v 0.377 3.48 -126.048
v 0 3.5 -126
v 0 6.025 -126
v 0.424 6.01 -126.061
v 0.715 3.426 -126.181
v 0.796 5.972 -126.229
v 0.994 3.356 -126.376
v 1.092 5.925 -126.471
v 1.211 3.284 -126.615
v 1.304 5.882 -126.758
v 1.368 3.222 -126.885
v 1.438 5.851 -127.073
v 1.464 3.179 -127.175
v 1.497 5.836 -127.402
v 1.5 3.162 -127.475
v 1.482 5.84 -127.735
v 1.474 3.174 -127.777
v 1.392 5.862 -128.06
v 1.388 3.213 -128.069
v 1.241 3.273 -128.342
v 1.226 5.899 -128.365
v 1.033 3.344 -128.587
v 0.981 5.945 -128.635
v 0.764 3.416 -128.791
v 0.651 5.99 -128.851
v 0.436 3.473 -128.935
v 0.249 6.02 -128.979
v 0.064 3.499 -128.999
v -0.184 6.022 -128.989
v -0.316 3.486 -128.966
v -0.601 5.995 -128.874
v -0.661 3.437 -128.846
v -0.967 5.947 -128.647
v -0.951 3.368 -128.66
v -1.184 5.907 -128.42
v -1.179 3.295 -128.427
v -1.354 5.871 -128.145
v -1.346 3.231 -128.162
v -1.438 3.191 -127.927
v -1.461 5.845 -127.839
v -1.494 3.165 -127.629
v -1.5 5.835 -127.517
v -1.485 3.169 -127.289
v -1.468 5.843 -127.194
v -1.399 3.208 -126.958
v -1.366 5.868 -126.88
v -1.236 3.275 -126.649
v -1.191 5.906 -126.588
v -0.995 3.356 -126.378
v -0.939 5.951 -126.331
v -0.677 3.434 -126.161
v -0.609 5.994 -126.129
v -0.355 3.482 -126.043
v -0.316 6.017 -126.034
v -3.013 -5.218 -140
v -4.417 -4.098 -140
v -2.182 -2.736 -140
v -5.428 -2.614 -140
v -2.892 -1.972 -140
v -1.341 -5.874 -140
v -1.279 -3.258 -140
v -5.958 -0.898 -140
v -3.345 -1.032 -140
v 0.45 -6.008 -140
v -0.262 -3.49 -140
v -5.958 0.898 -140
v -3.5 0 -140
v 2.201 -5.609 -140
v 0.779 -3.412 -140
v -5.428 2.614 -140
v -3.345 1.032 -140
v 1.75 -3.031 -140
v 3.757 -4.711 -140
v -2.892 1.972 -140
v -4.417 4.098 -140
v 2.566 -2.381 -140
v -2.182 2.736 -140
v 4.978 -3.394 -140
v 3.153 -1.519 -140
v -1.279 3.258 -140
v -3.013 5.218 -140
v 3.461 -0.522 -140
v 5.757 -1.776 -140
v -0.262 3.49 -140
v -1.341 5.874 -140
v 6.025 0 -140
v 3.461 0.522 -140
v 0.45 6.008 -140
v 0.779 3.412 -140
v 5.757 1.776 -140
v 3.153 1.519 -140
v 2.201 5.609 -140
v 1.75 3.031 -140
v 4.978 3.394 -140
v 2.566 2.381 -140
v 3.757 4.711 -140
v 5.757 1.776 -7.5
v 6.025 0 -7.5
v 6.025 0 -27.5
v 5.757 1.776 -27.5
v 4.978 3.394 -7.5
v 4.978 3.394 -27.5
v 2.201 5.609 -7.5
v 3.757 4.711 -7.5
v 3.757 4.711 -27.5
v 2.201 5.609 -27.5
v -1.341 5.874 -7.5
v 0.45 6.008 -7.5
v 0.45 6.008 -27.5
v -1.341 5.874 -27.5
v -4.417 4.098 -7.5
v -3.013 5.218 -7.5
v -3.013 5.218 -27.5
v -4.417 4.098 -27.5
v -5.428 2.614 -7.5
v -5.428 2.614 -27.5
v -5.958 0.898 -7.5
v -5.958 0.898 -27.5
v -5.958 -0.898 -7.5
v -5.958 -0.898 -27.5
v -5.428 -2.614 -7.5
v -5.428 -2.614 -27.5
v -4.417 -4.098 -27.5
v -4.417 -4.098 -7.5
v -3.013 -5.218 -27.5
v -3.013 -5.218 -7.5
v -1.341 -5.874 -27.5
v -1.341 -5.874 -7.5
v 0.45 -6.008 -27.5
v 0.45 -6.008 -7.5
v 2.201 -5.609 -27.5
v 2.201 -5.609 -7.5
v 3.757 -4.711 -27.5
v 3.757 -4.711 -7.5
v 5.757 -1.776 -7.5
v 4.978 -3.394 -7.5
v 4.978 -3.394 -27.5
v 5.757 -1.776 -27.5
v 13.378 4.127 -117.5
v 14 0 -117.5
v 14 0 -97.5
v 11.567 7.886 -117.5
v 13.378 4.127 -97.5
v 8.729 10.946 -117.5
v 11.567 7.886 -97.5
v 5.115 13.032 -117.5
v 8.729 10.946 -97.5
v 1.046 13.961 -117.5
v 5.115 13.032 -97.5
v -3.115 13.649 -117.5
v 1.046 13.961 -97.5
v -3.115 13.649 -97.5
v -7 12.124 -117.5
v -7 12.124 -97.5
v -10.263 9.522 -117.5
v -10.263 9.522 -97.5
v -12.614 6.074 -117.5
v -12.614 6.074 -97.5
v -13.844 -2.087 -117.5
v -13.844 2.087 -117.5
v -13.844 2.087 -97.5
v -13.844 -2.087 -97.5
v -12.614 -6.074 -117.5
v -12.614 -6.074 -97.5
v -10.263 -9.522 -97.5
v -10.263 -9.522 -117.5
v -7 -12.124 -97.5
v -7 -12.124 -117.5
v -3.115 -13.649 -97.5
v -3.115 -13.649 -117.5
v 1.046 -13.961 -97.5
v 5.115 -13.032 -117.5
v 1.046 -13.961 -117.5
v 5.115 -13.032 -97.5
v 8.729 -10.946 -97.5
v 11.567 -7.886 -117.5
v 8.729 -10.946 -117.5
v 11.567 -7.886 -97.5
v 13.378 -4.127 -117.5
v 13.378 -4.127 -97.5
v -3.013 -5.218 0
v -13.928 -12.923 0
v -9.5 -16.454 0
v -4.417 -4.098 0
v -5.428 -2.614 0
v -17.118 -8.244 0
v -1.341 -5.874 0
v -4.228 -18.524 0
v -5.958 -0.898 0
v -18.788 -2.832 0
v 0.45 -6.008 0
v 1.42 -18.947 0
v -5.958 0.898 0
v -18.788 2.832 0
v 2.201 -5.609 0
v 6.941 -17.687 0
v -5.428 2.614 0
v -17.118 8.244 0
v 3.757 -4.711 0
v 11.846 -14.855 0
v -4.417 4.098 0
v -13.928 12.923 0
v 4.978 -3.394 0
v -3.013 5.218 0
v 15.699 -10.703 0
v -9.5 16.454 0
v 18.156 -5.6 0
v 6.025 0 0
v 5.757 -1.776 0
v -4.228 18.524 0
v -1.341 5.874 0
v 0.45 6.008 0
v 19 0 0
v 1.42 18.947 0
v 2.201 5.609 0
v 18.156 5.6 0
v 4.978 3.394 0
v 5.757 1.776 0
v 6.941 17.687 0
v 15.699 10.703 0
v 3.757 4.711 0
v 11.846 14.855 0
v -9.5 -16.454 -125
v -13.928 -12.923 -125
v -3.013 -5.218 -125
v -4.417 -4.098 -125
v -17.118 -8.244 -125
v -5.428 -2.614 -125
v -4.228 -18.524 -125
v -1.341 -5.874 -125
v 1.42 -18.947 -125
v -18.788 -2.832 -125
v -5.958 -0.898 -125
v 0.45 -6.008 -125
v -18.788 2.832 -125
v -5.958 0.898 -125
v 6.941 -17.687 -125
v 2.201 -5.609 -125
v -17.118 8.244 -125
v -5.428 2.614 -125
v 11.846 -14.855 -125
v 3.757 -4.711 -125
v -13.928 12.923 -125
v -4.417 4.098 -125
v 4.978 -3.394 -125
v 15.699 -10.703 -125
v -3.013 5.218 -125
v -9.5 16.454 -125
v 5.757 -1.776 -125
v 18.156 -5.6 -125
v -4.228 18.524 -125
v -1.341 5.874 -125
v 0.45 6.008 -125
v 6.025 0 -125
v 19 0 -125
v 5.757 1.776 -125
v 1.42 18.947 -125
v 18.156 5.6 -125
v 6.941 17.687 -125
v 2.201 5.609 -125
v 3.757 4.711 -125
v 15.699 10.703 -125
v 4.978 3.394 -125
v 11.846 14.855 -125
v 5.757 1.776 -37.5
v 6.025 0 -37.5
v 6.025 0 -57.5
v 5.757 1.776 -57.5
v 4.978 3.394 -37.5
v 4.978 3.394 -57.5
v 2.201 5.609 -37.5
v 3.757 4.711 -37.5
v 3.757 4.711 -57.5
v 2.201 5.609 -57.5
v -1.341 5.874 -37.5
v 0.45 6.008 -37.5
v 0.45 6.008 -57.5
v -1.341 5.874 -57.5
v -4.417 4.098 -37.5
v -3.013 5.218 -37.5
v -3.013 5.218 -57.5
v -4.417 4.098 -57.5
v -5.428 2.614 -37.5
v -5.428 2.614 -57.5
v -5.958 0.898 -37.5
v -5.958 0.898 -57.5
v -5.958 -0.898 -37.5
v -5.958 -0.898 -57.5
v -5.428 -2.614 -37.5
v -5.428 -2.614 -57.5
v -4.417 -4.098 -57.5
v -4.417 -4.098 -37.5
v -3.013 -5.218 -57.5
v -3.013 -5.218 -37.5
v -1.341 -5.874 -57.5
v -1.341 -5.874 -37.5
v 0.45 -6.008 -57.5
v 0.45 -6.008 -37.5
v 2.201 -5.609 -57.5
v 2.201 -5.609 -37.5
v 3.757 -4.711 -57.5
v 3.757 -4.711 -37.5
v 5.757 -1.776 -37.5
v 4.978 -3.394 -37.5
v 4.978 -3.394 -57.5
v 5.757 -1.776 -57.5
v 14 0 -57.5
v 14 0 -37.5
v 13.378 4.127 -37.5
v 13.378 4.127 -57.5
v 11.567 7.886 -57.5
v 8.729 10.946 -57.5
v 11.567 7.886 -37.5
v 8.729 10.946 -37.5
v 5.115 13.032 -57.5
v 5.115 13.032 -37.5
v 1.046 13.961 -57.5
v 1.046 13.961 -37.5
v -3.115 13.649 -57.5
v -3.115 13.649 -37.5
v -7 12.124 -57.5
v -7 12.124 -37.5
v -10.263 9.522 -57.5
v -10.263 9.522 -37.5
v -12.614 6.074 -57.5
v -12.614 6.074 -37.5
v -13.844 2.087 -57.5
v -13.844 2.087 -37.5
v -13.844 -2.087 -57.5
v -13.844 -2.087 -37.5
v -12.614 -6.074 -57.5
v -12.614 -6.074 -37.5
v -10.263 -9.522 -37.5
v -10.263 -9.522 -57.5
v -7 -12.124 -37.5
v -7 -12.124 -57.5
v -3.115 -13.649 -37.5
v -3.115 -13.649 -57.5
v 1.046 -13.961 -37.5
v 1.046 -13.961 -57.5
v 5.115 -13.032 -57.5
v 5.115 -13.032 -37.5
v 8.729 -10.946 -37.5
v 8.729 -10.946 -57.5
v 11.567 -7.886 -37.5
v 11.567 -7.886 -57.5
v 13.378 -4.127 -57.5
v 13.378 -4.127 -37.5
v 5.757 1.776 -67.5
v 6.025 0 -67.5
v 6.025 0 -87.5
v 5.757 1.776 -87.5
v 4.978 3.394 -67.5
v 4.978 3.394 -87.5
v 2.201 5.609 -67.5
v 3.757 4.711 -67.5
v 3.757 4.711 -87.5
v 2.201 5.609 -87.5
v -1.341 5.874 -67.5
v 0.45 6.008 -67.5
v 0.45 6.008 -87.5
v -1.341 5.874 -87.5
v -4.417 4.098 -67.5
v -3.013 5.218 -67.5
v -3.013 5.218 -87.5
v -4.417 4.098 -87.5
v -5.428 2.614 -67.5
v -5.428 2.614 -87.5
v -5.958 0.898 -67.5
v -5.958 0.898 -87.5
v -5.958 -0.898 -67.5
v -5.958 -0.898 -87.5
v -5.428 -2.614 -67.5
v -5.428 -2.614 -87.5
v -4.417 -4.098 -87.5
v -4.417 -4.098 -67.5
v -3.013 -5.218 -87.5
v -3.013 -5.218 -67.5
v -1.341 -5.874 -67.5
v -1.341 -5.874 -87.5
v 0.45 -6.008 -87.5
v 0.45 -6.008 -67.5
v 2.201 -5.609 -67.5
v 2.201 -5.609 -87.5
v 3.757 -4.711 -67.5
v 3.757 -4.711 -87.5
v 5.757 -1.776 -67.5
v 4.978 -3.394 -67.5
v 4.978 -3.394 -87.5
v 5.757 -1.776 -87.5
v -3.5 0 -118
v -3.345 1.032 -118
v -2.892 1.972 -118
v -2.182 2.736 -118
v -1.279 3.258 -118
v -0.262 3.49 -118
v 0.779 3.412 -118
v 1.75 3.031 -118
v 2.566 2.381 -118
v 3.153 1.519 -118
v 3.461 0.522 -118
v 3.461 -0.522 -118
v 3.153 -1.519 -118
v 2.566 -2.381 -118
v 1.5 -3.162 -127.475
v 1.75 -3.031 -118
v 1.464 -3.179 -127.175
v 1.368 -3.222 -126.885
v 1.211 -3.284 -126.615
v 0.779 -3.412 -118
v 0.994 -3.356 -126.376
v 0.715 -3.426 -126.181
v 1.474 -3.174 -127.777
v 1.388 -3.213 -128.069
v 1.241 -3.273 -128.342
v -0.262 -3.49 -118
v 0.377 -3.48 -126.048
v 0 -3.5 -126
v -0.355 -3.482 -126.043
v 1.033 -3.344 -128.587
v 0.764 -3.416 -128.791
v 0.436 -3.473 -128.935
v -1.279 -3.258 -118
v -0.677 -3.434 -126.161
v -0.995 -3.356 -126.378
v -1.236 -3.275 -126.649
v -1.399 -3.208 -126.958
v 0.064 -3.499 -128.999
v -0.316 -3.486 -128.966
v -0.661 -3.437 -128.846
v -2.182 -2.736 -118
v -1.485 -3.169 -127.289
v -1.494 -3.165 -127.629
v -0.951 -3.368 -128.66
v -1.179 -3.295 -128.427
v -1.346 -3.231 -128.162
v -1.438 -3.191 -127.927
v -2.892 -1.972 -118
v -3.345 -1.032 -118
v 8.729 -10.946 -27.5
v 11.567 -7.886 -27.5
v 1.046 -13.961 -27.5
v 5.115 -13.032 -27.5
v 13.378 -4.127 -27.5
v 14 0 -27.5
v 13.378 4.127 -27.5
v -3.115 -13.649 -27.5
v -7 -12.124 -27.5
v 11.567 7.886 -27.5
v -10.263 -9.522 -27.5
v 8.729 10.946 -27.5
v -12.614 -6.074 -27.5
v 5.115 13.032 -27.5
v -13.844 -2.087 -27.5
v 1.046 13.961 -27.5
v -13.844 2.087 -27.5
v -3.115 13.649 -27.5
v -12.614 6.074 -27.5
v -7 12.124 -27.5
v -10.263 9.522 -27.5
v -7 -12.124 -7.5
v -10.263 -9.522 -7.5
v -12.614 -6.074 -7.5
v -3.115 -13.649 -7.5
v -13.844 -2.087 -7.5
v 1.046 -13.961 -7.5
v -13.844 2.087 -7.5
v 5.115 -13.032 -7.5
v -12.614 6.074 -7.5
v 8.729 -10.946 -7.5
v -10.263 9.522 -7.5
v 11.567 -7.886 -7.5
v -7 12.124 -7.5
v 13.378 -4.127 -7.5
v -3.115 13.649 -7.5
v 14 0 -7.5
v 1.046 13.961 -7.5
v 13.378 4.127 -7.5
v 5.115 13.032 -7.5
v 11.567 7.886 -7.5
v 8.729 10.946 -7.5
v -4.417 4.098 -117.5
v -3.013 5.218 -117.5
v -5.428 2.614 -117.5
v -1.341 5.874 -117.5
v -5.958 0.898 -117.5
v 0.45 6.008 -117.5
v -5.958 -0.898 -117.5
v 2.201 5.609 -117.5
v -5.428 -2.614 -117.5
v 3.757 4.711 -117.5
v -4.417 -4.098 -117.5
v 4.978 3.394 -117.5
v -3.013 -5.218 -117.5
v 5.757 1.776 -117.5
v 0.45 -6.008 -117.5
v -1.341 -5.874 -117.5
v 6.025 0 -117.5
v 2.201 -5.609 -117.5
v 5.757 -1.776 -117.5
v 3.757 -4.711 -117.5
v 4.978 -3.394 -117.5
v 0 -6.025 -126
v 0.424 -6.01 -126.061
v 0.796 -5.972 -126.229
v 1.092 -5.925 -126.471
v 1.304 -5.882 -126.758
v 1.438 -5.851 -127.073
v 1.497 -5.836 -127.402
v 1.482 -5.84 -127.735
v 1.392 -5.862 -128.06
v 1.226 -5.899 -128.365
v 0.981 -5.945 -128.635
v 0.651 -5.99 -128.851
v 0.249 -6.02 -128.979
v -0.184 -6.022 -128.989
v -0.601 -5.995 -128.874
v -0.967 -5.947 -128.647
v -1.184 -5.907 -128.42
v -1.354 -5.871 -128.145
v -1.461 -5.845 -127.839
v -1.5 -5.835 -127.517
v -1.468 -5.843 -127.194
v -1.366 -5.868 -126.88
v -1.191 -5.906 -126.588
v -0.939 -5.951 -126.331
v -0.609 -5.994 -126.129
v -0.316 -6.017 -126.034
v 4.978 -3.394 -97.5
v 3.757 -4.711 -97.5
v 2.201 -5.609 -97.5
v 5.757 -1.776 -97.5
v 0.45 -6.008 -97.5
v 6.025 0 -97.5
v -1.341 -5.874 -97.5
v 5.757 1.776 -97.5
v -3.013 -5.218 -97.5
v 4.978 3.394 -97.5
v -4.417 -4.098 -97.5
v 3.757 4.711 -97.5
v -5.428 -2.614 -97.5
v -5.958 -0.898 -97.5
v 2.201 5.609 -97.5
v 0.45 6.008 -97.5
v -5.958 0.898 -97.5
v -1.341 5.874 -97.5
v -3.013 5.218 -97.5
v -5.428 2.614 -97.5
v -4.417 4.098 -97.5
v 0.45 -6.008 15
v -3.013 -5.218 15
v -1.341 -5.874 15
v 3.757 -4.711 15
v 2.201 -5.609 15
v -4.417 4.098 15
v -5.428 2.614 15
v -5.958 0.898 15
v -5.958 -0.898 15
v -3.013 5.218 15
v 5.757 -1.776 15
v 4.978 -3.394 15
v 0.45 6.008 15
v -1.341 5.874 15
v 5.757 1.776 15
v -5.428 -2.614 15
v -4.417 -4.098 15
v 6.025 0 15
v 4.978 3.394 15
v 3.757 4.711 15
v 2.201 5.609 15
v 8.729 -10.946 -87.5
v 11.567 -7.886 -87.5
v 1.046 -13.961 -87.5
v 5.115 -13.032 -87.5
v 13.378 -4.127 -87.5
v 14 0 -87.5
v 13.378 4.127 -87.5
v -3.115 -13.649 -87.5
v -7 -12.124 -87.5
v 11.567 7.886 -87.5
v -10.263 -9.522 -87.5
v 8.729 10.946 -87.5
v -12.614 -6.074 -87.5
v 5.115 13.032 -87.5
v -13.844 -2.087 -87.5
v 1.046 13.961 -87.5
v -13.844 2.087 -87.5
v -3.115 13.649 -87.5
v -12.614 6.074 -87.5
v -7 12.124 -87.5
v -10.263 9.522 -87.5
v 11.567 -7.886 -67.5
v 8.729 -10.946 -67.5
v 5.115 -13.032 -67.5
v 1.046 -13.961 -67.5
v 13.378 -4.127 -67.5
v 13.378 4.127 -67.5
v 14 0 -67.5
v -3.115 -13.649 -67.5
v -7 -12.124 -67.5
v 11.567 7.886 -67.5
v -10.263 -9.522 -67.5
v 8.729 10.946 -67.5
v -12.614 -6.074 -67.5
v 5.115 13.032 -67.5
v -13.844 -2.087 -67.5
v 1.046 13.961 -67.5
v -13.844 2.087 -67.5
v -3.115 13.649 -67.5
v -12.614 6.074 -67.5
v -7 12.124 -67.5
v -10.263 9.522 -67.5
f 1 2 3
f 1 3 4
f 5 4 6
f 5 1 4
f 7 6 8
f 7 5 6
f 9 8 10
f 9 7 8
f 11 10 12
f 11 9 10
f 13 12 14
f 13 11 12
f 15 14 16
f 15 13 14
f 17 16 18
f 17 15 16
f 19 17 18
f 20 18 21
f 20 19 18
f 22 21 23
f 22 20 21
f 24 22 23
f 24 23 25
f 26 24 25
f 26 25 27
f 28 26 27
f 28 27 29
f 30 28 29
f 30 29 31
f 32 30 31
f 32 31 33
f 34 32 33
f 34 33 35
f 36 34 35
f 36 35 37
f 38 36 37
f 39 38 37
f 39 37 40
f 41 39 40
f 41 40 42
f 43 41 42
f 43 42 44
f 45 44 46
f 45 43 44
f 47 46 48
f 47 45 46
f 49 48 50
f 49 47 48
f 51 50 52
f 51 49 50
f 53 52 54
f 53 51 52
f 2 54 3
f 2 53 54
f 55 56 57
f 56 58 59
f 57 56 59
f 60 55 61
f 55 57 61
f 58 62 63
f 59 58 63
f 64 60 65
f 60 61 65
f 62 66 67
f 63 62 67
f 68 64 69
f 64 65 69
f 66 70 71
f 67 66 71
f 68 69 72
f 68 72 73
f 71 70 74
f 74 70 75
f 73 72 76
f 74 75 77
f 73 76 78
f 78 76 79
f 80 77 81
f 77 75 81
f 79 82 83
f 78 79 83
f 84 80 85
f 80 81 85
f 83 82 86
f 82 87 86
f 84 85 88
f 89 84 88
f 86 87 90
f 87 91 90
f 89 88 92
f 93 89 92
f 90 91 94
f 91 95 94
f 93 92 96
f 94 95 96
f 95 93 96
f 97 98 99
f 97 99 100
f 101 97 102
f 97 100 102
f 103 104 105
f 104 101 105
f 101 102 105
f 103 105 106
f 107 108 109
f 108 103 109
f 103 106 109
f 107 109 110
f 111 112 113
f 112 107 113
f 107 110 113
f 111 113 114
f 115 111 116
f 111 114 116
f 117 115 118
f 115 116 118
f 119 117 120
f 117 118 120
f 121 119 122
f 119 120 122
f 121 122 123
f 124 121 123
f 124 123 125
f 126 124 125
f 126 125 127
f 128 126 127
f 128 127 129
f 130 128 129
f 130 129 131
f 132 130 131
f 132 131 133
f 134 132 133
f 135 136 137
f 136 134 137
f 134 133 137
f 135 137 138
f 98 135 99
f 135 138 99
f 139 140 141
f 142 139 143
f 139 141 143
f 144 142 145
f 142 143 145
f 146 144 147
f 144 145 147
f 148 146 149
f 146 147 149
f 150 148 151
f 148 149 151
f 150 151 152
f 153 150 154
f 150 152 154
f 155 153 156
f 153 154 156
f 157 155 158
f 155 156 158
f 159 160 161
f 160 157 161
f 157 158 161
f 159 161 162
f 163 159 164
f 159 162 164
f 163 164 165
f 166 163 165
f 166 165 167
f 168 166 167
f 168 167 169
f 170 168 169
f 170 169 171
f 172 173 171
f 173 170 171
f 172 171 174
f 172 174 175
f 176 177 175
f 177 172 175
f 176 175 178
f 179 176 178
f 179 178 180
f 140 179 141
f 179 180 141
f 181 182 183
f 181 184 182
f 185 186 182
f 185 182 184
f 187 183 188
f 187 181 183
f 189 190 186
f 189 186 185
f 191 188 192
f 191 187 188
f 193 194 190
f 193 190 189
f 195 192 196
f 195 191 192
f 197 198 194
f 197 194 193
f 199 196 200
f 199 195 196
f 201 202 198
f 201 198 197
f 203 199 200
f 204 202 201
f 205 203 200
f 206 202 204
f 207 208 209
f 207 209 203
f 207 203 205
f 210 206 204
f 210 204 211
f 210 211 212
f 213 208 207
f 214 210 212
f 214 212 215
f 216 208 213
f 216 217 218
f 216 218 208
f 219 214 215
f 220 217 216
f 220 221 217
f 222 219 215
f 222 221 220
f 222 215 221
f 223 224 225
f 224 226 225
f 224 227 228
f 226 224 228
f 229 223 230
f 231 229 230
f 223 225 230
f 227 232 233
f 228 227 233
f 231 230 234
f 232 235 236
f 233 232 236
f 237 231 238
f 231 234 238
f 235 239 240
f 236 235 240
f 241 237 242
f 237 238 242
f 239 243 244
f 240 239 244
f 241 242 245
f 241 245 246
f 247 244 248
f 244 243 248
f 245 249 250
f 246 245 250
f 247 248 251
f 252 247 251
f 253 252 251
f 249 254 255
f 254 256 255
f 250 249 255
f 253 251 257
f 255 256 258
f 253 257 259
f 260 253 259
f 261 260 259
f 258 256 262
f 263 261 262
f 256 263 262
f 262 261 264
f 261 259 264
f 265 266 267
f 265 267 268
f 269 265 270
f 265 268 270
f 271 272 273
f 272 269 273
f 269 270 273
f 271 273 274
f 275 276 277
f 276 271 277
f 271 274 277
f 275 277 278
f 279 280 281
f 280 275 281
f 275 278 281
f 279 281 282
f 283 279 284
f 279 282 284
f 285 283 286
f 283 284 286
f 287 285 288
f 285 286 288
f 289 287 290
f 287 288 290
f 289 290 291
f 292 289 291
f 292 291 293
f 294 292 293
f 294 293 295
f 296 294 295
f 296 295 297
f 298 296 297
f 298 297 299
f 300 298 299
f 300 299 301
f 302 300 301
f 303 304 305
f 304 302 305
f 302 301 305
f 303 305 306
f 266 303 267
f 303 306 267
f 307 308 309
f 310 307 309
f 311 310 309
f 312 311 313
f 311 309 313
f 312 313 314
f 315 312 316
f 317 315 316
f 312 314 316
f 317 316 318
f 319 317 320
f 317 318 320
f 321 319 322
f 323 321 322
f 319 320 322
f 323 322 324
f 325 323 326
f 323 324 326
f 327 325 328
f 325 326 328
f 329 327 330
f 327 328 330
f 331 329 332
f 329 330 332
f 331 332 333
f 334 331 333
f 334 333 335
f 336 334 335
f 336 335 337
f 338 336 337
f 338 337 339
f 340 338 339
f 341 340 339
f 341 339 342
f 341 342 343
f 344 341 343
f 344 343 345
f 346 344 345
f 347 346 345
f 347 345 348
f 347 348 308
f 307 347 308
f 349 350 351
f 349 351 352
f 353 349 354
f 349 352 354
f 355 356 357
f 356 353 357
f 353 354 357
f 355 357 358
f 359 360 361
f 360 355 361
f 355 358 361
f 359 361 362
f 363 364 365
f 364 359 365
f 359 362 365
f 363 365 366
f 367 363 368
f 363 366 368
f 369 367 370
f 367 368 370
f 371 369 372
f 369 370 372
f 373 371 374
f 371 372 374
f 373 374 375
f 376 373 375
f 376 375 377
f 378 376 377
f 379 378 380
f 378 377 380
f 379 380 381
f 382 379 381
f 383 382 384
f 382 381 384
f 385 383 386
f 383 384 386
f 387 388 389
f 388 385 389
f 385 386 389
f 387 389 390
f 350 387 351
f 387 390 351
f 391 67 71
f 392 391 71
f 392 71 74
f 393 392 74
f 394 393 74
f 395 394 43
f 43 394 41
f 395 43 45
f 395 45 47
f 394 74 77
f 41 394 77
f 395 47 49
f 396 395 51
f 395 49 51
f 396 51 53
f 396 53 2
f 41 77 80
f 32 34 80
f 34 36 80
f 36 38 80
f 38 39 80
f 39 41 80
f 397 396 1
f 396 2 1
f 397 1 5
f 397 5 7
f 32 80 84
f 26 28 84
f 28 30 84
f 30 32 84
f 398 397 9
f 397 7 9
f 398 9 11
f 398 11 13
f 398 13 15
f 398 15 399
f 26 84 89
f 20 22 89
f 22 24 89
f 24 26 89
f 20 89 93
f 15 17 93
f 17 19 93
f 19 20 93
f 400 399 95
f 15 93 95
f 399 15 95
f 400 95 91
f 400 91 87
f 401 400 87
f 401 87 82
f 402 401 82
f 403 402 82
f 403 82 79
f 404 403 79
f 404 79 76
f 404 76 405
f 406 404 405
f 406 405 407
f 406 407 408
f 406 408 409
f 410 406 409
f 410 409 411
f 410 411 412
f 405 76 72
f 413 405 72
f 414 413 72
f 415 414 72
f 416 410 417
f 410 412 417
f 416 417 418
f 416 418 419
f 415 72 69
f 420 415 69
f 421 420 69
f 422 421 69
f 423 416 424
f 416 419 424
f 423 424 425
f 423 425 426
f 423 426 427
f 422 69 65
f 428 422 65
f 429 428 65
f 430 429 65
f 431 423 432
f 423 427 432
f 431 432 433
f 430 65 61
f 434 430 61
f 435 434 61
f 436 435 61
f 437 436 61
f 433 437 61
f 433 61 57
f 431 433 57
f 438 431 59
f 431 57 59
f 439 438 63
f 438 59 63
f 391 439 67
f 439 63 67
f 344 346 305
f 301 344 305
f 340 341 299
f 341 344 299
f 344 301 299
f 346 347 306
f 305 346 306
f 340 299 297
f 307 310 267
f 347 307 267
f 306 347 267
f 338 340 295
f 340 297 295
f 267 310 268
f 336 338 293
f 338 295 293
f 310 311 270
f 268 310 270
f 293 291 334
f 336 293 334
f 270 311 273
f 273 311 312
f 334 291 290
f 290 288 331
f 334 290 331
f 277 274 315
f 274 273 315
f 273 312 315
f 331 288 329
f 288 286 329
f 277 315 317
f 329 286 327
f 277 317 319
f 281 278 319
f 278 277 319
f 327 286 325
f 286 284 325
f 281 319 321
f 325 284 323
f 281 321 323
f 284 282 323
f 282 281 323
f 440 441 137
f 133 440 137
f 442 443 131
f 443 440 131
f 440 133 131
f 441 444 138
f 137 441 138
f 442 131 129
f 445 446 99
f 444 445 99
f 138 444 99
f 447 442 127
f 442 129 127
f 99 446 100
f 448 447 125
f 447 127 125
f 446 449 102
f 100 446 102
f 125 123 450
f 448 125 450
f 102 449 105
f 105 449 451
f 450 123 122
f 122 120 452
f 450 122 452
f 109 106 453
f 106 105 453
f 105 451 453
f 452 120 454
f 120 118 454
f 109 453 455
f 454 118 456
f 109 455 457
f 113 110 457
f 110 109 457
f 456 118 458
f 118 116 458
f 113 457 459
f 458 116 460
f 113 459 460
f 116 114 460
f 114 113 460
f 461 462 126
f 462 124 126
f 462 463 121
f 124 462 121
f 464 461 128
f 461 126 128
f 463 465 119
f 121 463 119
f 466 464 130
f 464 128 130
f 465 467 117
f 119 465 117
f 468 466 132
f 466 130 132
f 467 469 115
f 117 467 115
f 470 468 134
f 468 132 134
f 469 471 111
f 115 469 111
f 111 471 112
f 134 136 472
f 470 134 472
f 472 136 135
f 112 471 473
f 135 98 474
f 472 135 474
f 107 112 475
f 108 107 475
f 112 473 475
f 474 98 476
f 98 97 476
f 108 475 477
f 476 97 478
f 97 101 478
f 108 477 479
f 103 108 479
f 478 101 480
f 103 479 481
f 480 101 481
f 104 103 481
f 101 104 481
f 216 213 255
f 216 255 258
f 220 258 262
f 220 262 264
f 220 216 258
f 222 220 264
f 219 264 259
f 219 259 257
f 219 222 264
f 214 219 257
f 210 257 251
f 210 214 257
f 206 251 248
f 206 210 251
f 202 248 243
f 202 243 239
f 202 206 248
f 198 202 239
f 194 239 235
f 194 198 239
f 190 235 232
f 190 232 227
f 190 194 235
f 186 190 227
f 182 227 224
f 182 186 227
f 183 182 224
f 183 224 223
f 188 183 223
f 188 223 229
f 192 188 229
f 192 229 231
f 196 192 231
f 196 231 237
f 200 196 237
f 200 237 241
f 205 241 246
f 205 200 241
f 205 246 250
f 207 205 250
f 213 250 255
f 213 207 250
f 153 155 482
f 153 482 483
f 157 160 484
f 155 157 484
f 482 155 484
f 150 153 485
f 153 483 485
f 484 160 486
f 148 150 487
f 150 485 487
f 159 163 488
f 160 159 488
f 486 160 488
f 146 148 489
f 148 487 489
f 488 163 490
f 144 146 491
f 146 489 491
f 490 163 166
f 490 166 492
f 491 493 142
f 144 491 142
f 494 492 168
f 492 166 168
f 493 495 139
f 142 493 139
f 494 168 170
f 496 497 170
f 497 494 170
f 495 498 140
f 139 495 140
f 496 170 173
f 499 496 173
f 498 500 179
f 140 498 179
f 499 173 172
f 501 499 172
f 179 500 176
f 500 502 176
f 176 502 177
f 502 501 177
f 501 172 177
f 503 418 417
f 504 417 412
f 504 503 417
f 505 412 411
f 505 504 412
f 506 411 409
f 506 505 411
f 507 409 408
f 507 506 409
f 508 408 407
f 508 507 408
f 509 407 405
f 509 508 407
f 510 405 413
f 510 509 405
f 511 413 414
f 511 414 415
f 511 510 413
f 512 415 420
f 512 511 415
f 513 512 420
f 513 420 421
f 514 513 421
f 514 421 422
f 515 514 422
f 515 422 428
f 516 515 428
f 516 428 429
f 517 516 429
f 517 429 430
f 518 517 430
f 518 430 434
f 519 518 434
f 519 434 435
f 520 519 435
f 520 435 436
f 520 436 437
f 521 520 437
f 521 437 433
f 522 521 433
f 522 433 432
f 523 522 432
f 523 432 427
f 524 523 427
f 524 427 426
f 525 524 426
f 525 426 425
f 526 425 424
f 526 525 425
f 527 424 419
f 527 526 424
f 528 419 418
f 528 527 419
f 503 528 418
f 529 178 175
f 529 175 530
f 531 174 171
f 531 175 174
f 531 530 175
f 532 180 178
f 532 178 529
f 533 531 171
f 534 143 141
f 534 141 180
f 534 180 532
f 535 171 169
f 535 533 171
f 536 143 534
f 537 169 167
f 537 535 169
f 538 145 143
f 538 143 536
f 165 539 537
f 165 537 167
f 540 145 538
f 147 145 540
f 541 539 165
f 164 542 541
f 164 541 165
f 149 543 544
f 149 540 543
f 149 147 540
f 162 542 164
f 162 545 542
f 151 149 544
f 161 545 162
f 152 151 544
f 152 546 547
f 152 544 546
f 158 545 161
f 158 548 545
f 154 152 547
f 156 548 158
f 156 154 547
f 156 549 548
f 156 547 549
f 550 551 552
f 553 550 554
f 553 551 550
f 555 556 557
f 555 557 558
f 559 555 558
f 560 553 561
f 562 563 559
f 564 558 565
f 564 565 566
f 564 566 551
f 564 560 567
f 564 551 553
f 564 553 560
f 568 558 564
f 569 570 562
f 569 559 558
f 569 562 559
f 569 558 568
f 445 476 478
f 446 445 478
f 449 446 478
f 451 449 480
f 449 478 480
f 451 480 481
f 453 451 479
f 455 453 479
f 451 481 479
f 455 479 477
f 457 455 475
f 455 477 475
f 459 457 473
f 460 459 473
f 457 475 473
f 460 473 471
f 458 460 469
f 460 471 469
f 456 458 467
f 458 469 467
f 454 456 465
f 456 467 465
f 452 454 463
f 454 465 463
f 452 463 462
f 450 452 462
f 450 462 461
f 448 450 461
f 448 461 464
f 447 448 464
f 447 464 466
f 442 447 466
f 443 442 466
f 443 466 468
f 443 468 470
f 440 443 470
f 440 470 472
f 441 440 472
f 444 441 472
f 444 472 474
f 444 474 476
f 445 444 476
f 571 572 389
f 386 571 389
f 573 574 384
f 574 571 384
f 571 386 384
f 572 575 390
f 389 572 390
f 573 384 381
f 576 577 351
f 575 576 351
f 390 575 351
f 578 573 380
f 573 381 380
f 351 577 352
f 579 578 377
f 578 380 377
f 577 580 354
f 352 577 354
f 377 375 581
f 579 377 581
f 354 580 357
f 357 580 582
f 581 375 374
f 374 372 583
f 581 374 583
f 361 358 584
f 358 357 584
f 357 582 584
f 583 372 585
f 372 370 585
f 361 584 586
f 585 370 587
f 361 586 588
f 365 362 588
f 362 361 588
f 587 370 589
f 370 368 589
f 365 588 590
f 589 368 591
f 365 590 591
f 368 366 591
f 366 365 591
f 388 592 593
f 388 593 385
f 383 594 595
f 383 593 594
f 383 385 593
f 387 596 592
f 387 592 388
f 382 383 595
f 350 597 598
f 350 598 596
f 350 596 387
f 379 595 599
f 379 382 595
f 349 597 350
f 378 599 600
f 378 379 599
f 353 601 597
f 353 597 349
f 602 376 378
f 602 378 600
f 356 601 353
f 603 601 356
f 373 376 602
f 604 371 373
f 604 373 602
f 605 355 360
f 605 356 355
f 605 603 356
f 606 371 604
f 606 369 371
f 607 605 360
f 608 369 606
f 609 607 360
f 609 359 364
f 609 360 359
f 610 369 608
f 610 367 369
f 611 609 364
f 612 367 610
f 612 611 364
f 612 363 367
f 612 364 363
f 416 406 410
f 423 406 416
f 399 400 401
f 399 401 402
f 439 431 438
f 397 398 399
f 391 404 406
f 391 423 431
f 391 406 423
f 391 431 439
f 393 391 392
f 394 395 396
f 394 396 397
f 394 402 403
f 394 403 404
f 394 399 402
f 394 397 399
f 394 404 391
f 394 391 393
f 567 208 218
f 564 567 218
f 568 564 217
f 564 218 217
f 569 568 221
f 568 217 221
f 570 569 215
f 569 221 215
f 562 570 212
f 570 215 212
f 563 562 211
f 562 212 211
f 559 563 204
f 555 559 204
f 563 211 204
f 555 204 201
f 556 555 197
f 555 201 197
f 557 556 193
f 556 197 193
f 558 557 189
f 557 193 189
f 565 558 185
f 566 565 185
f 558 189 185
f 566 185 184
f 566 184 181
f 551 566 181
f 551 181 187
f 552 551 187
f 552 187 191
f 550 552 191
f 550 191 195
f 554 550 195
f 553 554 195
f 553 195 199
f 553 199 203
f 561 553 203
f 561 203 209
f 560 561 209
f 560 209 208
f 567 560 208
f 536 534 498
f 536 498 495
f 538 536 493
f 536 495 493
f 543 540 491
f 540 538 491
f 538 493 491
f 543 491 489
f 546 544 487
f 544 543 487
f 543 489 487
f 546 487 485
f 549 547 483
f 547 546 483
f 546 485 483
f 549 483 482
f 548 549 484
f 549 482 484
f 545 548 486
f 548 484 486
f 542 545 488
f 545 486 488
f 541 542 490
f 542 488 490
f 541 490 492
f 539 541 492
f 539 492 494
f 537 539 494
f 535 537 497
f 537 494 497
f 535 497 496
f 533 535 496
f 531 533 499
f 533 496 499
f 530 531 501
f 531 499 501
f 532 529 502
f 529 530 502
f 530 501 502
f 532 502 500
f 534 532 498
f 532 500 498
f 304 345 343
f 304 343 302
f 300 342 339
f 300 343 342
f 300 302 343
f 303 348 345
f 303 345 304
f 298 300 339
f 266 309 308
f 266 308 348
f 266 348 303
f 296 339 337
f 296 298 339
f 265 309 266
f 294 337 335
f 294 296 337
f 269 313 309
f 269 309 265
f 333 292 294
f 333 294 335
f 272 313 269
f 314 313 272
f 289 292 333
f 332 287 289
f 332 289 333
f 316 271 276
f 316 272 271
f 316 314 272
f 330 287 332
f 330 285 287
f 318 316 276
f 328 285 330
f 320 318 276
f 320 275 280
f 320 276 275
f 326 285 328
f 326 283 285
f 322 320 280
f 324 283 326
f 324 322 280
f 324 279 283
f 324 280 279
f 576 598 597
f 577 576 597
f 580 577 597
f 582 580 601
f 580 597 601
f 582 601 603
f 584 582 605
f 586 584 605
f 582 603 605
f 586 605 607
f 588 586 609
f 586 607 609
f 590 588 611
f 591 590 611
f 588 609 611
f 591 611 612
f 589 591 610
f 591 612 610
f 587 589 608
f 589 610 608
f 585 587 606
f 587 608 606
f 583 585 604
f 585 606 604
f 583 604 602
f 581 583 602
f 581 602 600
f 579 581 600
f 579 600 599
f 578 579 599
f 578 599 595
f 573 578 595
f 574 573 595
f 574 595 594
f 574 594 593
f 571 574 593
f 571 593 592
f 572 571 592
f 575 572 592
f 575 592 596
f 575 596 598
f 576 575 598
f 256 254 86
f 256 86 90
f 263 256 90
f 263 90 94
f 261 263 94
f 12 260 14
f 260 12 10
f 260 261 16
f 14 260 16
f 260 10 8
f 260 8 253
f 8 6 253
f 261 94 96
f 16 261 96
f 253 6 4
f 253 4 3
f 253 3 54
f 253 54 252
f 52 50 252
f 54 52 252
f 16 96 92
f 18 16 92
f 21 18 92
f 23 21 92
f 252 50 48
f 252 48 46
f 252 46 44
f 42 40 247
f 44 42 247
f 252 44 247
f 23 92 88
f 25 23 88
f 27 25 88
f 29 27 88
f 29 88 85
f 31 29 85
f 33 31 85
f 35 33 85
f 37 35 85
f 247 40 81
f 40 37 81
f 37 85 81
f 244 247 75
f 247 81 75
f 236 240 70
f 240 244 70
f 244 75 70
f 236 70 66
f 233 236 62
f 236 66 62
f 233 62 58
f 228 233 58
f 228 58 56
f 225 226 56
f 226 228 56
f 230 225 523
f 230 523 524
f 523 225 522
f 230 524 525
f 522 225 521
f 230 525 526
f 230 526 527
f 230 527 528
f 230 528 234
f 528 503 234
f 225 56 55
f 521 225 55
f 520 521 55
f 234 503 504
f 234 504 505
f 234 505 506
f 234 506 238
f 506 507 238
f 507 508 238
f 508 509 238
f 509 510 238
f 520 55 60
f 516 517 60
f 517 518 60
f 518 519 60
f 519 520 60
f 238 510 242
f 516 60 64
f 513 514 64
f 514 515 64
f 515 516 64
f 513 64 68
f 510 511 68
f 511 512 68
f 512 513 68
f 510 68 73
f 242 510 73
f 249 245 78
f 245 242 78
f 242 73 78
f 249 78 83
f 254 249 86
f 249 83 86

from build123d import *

# Parameters (mm, degrees)
SKETCH1_R                 = 19
SKETCH1_R_2               = 14
BOSS_EXTRUDE1_DEPTH       = 125
BOSS_EXTRUDE2_START       = 7.5
SKETCH2_R                 = 14
BOSS_EXTRUDE2_DEPTH       = 7.5
CUT_EXTRUDE1_DEPTH        = 121.53319045
CUT_EXTRUDE1_DEPTH_BACK   = 121.53319045
SKETCH4_R                 = 6.025
SKETCH5_R                 = 14
BOSS_EXTRUDE3_DEPTH       = 7.5
BOSS_EXTRUDE4_DEPTH       = 15
BOSS_EXTRUDE4_DEPTH_BACK  = 140
SKETCH7_R                 = 6.025
CUT_EXTRUDE2_DEPTH        = 143.555252446
CUT_EXTRUDE2_DEPTH_BACK   = 143.555252446
SKETCH8_R                 = 1.5
SKETCH9_R                 = 3.5
CUT_EXTRUDE3_DEPTH        = 22
SKETCH11_R                = 15
BOSS_EXTRUDE5_DEPTH       = 5
LPATTERN1_COUNT           = 2
LPATTERN1_PITCH           = 30
LPATTERN2_COPY_1_SKETCH_R = 15
LPATTERN2_COPY_1_DEPTH    = 5
LPATTERN2_COPY_2_SKETCH_R = 15
LPATTERN2_COPY_2_DEPTH    = 5


with BuildPart() as part:
    # Sketch1 → Boss-Extrude1 (new body)
    with BuildSketch(Plane.XY):
        Circle(SKETCH1_R)
        Circle(SKETCH1_R_2, mode=Mode.SUBTRACT)
    extrude(amount=-BOSS_EXTRUDE1_DEPTH)

    # Sketch2 → Boss-Extrude2 (add)
    with BuildSketch(Plane.XY.offset(-7.5).offset(BOSS_EXTRUDE2_START)):
        Circle(SKETCH2_R)
    extrude(amount=-BOSS_EXTRUDE2_DEPTH)

    # Sketch4 → Cut-Extrude1 (cut, two sides: drawn at the far end of the back side and taken through both)
    with BuildSketch(Plane.XY.offset(-7.5).offset(-CUT_EXTRUDE1_DEPTH_BACK)):
        Circle(SKETCH4_R)
    extrude(amount=CUT_EXTRUDE1_DEPTH + CUT_EXTRUDE1_DEPTH_BACK, mode=Mode.SUBTRACT)

    # Sketch5 → Boss-Extrude3 (add)
    with BuildSketch(Plane(origin=(0, 0, -117.5), x_dir=(-1, 0, 0), z_dir=(0, 0, -1))):
        with Locations(Location((0, 0, 0), (0, 0, 180))):
            Circle(SKETCH5_R)
    extrude(amount=BOSS_EXTRUDE3_DEPTH)

    # Sketch7 → Boss-Extrude4 (add, two sides: drawn at the far end of the back side and taken through both)
    with BuildSketch(Plane.XY.offset(-BOSS_EXTRUDE4_DEPTH_BACK)):
        Circle(SKETCH7_R)
    extrude(amount=BOSS_EXTRUDE4_DEPTH + BOSS_EXTRUDE4_DEPTH_BACK)

    # Sketch8 → Cut-Extrude2 (cut, two sides: drawn at the far end of the back side and taken through both)
    with BuildSketch(Plane(origin=(0, 0, 0), x_dir=(1, 0, 0), z_dir=(0, 1, 0)).offset(-CUT_EXTRUDE2_DEPTH_BACK)):
        with Locations(Location((0, 127.5, 0), (0, 0, 270))):
            Circle(SKETCH8_R)
    extrude(amount=CUT_EXTRUDE2_DEPTH + CUT_EXTRUDE2_DEPTH_BACK, mode=Mode.SUBTRACT)

    # Sketch9 → Cut-Extrude3 (cut)
    with BuildSketch(Plane(origin=(0, 0, -140), x_dir=(-1, 0, 0), z_dir=(0, 0, -1))):
        Circle(SKETCH9_R)
    extrude(amount=-CUT_EXTRUDE3_DEPTH, mode=Mode.SUBTRACT)

    # Sketch11 → Boss-Extrude5 (add, symmetric)
    with BuildSketch(Plane(origin=(0, 0, -62.5), x_dir=(-1, 0, 0), z_dir=(0, 0, -1))):
        Circle(SKETCH11_R)
    boss_extrude5 = extrude(amount=BOSS_EXTRUDE5_DEPTH, both=True)

    # LPattern1: Boss-Extrude5 ×2
    with Locations(*[(0, 0, -i * LPATTERN1_PITCH) for i in range(1, LPATTERN1_COUNT)]):
        add(boss_extrude5)

    # LPattern2 copy 1 sketch → LPattern2 copy 1 (add, symmetric)
    with BuildSketch(Plane(origin=(0, 0, -62.5), x_dir=(-1, 0, 0), z_dir=(0, 0, -1))):
        Circle(LPATTERN2_COPY_1_SKETCH_R)
    extrude(amount=LPATTERN2_COPY_1_DEPTH, both=True)

    # LPattern2 copy 2 sketch → LPattern2 copy 2 (add, symmetric)
    with BuildSketch(Plane(origin=(0, 0, -32.5), x_dir=(-1, 0, 0), z_dir=(0, 0, -1))):
        Circle(LPATTERN2_COPY_2_SKETCH_R)
    extrude(amount=LPATTERN2_COPY_2_DEPTH, both=True)


solid = part.part
